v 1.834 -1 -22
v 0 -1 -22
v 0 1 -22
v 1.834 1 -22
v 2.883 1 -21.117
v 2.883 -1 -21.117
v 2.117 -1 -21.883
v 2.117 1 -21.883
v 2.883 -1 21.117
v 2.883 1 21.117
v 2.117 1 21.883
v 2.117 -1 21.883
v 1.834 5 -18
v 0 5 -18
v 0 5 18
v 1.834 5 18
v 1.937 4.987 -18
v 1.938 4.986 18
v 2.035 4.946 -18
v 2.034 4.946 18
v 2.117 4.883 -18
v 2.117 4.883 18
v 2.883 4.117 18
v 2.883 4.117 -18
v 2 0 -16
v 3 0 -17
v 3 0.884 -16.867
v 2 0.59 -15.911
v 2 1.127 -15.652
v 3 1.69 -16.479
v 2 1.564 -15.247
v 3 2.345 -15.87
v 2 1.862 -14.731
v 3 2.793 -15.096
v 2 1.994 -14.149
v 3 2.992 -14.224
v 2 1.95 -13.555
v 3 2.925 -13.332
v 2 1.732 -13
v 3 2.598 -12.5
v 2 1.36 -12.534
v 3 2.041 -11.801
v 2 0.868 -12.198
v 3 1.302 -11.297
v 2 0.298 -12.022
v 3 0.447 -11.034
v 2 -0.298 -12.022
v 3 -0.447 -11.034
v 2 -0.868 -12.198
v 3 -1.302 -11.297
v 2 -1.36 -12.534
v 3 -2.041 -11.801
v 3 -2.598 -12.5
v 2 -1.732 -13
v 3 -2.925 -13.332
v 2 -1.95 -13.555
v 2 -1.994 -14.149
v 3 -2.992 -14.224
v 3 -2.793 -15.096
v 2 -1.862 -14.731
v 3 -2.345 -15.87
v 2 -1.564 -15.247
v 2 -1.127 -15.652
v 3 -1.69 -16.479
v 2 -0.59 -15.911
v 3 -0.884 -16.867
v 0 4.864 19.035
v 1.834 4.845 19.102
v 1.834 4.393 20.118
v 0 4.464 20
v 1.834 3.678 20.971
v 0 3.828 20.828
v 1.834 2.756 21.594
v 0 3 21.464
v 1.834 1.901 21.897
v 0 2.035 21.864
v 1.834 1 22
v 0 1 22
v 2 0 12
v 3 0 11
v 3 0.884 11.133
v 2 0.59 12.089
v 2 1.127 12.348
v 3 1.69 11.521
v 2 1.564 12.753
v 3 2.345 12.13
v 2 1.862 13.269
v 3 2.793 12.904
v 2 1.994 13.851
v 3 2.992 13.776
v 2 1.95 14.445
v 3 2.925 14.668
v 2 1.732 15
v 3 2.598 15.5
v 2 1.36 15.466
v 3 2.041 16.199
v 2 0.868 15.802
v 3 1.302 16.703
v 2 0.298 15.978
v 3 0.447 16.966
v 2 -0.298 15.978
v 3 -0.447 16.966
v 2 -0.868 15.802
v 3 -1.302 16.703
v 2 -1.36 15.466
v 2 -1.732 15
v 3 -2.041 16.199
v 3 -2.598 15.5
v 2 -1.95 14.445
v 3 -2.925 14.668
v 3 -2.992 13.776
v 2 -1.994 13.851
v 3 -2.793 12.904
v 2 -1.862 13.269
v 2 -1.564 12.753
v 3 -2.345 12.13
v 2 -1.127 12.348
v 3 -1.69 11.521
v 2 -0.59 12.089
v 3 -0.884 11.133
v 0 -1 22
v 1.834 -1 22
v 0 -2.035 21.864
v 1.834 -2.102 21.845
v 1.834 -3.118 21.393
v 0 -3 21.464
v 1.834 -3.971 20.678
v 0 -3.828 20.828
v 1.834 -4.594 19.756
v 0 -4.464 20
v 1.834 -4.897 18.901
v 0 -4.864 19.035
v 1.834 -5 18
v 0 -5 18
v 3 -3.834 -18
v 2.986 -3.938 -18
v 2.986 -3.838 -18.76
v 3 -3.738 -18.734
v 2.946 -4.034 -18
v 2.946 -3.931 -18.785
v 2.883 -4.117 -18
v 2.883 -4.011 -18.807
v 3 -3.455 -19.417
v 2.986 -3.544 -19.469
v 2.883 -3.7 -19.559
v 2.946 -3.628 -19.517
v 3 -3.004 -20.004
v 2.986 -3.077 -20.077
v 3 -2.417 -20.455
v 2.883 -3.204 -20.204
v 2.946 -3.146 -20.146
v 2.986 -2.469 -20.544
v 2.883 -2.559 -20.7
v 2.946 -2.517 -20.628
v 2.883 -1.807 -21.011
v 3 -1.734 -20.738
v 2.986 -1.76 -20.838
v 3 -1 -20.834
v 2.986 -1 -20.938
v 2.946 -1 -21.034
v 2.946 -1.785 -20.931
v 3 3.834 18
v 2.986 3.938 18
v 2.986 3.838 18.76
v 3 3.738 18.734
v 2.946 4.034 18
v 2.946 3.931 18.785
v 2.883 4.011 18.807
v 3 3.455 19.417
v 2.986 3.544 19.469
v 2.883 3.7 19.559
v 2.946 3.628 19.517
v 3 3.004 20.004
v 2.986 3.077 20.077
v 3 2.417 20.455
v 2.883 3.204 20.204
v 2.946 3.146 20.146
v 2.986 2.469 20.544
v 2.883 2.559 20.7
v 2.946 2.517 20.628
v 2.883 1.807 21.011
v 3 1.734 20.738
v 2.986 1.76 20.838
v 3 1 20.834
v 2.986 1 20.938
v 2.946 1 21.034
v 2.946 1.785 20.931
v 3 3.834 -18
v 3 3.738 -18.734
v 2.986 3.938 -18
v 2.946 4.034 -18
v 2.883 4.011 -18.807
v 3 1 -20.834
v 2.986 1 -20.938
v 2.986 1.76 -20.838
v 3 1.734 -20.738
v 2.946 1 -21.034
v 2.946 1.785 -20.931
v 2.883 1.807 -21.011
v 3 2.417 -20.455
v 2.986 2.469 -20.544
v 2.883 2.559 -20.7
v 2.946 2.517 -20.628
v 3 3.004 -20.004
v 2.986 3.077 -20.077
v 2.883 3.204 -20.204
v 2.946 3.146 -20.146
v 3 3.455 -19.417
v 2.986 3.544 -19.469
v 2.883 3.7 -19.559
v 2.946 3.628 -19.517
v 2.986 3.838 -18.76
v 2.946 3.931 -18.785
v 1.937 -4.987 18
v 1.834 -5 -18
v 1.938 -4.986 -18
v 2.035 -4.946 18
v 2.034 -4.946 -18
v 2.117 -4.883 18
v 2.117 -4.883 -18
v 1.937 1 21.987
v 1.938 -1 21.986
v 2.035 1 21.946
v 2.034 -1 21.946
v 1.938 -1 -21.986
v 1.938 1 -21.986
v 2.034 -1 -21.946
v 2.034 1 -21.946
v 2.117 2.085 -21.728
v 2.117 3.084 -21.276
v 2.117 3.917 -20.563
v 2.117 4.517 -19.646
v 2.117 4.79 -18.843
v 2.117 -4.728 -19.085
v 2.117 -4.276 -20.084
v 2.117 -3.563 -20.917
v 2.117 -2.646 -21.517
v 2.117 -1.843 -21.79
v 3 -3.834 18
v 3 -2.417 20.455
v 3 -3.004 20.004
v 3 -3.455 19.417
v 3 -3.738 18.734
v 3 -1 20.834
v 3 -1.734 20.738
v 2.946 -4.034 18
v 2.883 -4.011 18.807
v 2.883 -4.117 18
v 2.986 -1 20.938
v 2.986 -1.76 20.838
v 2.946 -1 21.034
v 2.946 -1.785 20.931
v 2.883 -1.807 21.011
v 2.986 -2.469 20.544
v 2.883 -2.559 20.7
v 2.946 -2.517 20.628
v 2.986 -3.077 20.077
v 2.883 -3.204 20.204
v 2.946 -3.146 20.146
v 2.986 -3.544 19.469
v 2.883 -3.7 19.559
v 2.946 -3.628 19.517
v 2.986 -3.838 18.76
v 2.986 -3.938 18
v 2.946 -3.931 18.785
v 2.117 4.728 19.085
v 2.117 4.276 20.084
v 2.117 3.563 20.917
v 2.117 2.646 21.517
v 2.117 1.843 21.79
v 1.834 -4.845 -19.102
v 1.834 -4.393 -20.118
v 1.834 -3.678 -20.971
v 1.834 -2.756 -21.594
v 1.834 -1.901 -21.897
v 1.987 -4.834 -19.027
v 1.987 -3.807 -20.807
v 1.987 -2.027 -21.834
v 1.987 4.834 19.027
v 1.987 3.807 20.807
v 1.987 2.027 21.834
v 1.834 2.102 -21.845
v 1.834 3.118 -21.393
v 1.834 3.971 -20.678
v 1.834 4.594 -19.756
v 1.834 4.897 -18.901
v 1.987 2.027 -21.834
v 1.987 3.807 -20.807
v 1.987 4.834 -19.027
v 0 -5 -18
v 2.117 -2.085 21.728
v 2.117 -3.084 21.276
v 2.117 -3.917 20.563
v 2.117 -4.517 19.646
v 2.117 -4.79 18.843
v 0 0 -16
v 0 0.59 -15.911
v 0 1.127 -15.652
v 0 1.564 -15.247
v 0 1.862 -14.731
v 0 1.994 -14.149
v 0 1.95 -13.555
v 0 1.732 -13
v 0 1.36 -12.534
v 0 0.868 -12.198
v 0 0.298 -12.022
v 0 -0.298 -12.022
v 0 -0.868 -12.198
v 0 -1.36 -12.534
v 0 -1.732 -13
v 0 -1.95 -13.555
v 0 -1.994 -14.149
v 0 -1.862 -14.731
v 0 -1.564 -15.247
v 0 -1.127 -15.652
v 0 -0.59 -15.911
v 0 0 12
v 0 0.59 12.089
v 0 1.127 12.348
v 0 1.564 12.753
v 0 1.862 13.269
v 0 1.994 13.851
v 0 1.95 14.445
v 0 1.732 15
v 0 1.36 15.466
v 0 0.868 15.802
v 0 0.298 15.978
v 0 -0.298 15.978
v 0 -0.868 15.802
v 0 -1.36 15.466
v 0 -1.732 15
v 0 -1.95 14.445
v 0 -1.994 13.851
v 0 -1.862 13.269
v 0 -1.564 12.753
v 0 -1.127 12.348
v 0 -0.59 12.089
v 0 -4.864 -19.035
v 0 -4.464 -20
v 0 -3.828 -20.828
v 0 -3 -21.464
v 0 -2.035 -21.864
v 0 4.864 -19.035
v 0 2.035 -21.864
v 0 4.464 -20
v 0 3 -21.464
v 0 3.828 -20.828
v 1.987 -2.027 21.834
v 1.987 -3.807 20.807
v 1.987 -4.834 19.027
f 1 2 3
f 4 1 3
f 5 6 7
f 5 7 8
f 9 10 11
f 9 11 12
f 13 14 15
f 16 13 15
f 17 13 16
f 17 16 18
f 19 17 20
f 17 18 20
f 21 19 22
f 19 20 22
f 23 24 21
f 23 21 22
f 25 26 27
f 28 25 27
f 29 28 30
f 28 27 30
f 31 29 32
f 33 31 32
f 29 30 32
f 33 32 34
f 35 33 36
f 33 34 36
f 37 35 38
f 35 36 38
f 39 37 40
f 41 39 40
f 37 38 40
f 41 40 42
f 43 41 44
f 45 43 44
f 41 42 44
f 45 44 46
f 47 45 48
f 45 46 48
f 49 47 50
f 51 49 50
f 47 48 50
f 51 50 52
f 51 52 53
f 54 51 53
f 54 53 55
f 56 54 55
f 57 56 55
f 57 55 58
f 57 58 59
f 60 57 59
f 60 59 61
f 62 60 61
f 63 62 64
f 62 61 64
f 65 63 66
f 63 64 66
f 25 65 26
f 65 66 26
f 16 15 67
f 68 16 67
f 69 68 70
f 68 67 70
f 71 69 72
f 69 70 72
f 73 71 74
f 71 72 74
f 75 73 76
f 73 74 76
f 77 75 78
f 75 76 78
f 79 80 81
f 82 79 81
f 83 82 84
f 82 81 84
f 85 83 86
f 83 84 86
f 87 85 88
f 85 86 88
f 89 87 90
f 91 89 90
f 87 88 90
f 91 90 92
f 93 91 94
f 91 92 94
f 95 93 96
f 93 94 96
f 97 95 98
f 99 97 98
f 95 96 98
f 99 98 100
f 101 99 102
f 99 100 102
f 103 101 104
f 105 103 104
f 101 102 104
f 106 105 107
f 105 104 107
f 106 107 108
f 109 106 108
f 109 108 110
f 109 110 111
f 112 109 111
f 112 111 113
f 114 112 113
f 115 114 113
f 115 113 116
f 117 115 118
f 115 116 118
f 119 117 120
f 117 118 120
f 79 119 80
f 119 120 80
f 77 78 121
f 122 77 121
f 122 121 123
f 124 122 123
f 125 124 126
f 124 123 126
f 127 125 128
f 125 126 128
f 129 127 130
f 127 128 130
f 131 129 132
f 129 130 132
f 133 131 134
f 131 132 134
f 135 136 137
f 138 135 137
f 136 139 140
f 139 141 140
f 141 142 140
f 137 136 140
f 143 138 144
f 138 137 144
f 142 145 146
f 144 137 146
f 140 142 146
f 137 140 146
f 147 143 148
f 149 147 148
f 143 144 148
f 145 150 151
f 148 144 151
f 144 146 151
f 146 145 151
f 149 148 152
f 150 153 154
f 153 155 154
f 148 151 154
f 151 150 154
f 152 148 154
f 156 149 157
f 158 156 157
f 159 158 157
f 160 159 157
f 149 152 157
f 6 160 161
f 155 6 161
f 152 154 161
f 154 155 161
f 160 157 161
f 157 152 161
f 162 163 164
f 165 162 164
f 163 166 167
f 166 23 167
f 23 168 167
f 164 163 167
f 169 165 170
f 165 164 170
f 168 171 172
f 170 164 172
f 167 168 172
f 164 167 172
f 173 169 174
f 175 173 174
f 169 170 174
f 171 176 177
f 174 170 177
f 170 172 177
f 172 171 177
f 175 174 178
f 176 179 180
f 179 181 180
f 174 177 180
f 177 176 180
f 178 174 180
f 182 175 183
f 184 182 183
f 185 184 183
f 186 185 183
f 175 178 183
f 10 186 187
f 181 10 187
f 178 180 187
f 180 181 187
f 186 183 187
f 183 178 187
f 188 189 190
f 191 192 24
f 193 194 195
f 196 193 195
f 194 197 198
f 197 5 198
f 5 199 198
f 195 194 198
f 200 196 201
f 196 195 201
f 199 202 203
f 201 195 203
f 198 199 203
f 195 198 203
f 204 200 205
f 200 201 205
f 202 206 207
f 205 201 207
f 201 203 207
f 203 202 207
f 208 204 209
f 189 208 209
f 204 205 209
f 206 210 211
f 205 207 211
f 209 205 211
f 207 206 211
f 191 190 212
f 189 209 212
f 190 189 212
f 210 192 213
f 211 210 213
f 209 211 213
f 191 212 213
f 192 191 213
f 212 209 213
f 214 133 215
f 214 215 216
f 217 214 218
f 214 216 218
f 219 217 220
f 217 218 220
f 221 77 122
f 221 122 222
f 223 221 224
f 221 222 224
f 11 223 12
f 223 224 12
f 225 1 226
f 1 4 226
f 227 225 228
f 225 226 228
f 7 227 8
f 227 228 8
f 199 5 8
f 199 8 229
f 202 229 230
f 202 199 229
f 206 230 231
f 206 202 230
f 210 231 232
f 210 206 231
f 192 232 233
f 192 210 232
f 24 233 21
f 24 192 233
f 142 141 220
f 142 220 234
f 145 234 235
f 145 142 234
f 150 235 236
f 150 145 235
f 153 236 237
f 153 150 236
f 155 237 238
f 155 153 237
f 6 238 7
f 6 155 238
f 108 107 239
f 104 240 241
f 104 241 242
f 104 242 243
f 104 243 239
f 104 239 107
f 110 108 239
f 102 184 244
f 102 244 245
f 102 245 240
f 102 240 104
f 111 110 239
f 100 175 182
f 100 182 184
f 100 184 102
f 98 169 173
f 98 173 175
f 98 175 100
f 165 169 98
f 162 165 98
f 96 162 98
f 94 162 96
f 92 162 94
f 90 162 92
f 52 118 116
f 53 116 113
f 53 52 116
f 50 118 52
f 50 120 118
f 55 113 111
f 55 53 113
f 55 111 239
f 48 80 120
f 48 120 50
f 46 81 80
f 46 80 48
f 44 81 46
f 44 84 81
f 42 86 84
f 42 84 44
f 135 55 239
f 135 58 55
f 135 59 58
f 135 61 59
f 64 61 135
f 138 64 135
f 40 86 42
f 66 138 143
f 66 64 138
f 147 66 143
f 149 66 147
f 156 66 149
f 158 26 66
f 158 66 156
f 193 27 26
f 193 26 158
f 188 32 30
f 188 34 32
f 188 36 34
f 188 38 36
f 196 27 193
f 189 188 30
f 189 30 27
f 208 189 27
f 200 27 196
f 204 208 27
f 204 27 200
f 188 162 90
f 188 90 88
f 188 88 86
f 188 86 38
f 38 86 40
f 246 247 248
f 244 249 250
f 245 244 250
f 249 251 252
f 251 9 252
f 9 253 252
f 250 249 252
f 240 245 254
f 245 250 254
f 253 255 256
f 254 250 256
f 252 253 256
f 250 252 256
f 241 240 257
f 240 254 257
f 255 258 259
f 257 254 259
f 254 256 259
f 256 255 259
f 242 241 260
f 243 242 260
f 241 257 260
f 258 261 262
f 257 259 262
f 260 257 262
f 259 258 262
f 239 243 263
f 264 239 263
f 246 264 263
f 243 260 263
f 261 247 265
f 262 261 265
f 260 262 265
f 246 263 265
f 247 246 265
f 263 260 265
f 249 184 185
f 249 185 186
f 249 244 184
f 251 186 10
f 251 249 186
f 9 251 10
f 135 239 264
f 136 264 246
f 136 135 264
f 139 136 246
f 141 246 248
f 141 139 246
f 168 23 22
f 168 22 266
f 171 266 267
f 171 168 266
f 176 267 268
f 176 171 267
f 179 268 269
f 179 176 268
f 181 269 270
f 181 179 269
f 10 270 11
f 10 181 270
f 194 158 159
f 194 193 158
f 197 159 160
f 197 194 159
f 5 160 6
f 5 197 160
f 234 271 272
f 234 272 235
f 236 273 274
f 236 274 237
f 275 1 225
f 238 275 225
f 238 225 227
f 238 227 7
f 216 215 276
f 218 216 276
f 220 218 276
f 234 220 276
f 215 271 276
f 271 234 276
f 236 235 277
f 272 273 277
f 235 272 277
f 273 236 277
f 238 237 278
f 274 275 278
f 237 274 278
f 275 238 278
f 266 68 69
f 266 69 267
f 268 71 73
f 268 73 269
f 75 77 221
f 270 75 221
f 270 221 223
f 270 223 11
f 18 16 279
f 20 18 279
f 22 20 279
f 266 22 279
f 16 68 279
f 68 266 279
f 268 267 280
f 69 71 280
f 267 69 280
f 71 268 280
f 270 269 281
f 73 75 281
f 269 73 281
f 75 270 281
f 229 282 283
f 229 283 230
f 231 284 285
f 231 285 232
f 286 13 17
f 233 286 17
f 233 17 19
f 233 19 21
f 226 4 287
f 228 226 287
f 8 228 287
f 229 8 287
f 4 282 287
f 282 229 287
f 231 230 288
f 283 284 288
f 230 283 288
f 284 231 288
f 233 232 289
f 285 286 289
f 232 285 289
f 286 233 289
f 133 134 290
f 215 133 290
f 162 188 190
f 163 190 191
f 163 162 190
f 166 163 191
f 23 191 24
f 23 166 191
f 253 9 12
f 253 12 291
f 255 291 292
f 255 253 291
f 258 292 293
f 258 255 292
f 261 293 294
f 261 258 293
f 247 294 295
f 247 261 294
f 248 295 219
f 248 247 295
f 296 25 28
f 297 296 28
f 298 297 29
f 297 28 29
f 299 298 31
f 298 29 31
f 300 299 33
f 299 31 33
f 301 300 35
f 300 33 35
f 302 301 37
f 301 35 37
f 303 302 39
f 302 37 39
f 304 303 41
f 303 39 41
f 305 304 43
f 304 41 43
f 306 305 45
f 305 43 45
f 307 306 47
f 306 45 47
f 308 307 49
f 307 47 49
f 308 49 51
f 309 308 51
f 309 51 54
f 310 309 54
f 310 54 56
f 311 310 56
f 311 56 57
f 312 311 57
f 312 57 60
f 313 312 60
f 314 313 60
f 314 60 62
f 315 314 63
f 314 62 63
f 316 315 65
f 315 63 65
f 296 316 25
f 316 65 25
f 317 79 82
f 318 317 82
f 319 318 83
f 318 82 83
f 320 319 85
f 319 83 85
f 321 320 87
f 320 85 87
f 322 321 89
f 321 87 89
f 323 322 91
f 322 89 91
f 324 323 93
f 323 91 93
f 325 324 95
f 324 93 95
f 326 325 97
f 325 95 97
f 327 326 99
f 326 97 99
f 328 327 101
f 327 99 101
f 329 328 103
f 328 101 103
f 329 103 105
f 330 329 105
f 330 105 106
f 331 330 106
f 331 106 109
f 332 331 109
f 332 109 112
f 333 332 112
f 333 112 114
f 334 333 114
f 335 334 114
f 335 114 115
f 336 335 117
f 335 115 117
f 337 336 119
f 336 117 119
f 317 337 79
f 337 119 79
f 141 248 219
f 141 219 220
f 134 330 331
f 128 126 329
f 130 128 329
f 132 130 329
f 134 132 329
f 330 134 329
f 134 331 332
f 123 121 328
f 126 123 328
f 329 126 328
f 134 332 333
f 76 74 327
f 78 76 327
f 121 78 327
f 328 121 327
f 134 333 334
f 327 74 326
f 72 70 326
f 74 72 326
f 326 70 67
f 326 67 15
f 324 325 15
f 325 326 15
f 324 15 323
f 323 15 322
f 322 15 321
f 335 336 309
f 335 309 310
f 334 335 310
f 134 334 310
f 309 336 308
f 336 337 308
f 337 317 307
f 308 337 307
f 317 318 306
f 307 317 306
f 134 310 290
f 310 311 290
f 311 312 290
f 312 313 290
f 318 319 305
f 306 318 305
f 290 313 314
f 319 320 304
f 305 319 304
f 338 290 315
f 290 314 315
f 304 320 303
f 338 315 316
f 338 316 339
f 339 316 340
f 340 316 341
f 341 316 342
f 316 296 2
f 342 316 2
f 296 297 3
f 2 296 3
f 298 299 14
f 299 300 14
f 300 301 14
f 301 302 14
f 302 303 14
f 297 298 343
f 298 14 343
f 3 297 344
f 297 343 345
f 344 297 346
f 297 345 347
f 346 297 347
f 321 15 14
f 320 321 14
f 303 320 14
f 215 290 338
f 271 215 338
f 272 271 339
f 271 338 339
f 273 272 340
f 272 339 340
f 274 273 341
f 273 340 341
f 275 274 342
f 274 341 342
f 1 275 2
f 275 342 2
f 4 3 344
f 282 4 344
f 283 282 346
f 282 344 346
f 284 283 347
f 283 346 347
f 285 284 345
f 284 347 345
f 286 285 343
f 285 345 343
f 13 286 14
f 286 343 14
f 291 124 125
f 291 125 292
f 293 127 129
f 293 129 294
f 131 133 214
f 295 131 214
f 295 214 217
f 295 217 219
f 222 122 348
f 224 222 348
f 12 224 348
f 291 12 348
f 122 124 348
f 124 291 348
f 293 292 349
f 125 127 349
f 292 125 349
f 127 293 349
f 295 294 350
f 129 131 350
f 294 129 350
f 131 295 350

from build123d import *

# Parameters (mm, degrees)
BOSS_EXTRUDE1_DEPTH = 3
CHAMFER1_SIZE       = 1
FILLET1_R           = 0.4
SKETCH2_R           = 2
CUT_EXTRUDE1_DEPTH  = 3
CHAMFER2_SIZE       = 1


with BuildPart() as part:
    # Sketch1 → Boss-Extrude1 (new body)
    with BuildSketch(Plane(origin=(0, 0, 0), x_dir=(0, 0, -1), z_dir=(1, 0, 0))):
        with BuildLine():
            Line((-18, -5), (18, -5))
            ThreePointArc((18, -5), (20.828427125, -3.828427125), (22, -1))
            Line((22, -1), (22, 1))
            ThreePointArc((22, 1), (20.828427125, 3.828427125), (18, 5))
            Line((18, 5), (-18, 5))
            ThreePointArc((-18, 5), (-20.828427125, 3.828427125), (-22, 1))
            Line((-22, 1), (-22, -1))
            ThreePointArc((-22, -1), (-20.828427125, -3.828427125), (-18, -5))
        make_face()
    extrude(amount=BOSS_EXTRUDE1_DEPTH)

    # Chamfer1
    chamfer1_edges = [part.edges().sort_by_distance(p)[0] for p in [
        (3, 3.828427125, 20.828427125),
        (3, 0, 22),
        (3, -3.828427125, 20.828427125),
        (3, -5, 0),
        (3, -3.828427125, -20.828427125),
        (3, 0, -22),
        (3, 3.828427125, -20.828427125),
        (3, 5, 0),
    ]]
    chamfer(chamfer1_edges, length=CHAMFER1_SIZE)

    # Fillet1
    fillet1_edges = [part.edges().sort_by_distance(p)[0] for p in [
        (3, 3.121320344, -20.121320344),
        (3, 4, 0),
        (3, 3.121320344, 20.121320344),
        (3, 0, 21),
        (3, -3.121320344, 20.121320344),
        (3, -4, 0),
        (3, -3.121320344, -20.121320344),
        (3, 0, -21),
        (2, 0, -22),
        (2, -3.828427125, -20.828427125),
        (2, -5, 0),
        (2, -3.828427125, 20.828427125),
        (2, 0, 22),
        (2, 3.828427125, 20.828427125),
        (2, 5, 0),
        (2, 3.828427125, -20.828427125),
    ]]
    fillet(fillet1_edges, radius=FILLET1_R)

    # Sketch2 → Cut-Extrude1 (cut)
    with BuildSketch(Plane(origin=(3, 0, 0), x_dir=(0, 0, -1), z_dir=(1, 0, 0))):
        with Locations((-14, 0)):
            Circle(SKETCH2_R)
        with Locations((14, 0)):
            Circle(SKETCH2_R)
    extrude(amount=-CUT_EXTRUDE1_DEPTH, mode=Mode.SUBTRACT)

    # Chamfer2
    chamfer2_edges = [part.edges().sort_by_distance(p)[0] for p in [
        (3, 0, 16),
        (3, 0, -12),
    ]]
    chamfer(chamfer2_edges, length=CHAMFER2_SIZE)


solid = part.part
